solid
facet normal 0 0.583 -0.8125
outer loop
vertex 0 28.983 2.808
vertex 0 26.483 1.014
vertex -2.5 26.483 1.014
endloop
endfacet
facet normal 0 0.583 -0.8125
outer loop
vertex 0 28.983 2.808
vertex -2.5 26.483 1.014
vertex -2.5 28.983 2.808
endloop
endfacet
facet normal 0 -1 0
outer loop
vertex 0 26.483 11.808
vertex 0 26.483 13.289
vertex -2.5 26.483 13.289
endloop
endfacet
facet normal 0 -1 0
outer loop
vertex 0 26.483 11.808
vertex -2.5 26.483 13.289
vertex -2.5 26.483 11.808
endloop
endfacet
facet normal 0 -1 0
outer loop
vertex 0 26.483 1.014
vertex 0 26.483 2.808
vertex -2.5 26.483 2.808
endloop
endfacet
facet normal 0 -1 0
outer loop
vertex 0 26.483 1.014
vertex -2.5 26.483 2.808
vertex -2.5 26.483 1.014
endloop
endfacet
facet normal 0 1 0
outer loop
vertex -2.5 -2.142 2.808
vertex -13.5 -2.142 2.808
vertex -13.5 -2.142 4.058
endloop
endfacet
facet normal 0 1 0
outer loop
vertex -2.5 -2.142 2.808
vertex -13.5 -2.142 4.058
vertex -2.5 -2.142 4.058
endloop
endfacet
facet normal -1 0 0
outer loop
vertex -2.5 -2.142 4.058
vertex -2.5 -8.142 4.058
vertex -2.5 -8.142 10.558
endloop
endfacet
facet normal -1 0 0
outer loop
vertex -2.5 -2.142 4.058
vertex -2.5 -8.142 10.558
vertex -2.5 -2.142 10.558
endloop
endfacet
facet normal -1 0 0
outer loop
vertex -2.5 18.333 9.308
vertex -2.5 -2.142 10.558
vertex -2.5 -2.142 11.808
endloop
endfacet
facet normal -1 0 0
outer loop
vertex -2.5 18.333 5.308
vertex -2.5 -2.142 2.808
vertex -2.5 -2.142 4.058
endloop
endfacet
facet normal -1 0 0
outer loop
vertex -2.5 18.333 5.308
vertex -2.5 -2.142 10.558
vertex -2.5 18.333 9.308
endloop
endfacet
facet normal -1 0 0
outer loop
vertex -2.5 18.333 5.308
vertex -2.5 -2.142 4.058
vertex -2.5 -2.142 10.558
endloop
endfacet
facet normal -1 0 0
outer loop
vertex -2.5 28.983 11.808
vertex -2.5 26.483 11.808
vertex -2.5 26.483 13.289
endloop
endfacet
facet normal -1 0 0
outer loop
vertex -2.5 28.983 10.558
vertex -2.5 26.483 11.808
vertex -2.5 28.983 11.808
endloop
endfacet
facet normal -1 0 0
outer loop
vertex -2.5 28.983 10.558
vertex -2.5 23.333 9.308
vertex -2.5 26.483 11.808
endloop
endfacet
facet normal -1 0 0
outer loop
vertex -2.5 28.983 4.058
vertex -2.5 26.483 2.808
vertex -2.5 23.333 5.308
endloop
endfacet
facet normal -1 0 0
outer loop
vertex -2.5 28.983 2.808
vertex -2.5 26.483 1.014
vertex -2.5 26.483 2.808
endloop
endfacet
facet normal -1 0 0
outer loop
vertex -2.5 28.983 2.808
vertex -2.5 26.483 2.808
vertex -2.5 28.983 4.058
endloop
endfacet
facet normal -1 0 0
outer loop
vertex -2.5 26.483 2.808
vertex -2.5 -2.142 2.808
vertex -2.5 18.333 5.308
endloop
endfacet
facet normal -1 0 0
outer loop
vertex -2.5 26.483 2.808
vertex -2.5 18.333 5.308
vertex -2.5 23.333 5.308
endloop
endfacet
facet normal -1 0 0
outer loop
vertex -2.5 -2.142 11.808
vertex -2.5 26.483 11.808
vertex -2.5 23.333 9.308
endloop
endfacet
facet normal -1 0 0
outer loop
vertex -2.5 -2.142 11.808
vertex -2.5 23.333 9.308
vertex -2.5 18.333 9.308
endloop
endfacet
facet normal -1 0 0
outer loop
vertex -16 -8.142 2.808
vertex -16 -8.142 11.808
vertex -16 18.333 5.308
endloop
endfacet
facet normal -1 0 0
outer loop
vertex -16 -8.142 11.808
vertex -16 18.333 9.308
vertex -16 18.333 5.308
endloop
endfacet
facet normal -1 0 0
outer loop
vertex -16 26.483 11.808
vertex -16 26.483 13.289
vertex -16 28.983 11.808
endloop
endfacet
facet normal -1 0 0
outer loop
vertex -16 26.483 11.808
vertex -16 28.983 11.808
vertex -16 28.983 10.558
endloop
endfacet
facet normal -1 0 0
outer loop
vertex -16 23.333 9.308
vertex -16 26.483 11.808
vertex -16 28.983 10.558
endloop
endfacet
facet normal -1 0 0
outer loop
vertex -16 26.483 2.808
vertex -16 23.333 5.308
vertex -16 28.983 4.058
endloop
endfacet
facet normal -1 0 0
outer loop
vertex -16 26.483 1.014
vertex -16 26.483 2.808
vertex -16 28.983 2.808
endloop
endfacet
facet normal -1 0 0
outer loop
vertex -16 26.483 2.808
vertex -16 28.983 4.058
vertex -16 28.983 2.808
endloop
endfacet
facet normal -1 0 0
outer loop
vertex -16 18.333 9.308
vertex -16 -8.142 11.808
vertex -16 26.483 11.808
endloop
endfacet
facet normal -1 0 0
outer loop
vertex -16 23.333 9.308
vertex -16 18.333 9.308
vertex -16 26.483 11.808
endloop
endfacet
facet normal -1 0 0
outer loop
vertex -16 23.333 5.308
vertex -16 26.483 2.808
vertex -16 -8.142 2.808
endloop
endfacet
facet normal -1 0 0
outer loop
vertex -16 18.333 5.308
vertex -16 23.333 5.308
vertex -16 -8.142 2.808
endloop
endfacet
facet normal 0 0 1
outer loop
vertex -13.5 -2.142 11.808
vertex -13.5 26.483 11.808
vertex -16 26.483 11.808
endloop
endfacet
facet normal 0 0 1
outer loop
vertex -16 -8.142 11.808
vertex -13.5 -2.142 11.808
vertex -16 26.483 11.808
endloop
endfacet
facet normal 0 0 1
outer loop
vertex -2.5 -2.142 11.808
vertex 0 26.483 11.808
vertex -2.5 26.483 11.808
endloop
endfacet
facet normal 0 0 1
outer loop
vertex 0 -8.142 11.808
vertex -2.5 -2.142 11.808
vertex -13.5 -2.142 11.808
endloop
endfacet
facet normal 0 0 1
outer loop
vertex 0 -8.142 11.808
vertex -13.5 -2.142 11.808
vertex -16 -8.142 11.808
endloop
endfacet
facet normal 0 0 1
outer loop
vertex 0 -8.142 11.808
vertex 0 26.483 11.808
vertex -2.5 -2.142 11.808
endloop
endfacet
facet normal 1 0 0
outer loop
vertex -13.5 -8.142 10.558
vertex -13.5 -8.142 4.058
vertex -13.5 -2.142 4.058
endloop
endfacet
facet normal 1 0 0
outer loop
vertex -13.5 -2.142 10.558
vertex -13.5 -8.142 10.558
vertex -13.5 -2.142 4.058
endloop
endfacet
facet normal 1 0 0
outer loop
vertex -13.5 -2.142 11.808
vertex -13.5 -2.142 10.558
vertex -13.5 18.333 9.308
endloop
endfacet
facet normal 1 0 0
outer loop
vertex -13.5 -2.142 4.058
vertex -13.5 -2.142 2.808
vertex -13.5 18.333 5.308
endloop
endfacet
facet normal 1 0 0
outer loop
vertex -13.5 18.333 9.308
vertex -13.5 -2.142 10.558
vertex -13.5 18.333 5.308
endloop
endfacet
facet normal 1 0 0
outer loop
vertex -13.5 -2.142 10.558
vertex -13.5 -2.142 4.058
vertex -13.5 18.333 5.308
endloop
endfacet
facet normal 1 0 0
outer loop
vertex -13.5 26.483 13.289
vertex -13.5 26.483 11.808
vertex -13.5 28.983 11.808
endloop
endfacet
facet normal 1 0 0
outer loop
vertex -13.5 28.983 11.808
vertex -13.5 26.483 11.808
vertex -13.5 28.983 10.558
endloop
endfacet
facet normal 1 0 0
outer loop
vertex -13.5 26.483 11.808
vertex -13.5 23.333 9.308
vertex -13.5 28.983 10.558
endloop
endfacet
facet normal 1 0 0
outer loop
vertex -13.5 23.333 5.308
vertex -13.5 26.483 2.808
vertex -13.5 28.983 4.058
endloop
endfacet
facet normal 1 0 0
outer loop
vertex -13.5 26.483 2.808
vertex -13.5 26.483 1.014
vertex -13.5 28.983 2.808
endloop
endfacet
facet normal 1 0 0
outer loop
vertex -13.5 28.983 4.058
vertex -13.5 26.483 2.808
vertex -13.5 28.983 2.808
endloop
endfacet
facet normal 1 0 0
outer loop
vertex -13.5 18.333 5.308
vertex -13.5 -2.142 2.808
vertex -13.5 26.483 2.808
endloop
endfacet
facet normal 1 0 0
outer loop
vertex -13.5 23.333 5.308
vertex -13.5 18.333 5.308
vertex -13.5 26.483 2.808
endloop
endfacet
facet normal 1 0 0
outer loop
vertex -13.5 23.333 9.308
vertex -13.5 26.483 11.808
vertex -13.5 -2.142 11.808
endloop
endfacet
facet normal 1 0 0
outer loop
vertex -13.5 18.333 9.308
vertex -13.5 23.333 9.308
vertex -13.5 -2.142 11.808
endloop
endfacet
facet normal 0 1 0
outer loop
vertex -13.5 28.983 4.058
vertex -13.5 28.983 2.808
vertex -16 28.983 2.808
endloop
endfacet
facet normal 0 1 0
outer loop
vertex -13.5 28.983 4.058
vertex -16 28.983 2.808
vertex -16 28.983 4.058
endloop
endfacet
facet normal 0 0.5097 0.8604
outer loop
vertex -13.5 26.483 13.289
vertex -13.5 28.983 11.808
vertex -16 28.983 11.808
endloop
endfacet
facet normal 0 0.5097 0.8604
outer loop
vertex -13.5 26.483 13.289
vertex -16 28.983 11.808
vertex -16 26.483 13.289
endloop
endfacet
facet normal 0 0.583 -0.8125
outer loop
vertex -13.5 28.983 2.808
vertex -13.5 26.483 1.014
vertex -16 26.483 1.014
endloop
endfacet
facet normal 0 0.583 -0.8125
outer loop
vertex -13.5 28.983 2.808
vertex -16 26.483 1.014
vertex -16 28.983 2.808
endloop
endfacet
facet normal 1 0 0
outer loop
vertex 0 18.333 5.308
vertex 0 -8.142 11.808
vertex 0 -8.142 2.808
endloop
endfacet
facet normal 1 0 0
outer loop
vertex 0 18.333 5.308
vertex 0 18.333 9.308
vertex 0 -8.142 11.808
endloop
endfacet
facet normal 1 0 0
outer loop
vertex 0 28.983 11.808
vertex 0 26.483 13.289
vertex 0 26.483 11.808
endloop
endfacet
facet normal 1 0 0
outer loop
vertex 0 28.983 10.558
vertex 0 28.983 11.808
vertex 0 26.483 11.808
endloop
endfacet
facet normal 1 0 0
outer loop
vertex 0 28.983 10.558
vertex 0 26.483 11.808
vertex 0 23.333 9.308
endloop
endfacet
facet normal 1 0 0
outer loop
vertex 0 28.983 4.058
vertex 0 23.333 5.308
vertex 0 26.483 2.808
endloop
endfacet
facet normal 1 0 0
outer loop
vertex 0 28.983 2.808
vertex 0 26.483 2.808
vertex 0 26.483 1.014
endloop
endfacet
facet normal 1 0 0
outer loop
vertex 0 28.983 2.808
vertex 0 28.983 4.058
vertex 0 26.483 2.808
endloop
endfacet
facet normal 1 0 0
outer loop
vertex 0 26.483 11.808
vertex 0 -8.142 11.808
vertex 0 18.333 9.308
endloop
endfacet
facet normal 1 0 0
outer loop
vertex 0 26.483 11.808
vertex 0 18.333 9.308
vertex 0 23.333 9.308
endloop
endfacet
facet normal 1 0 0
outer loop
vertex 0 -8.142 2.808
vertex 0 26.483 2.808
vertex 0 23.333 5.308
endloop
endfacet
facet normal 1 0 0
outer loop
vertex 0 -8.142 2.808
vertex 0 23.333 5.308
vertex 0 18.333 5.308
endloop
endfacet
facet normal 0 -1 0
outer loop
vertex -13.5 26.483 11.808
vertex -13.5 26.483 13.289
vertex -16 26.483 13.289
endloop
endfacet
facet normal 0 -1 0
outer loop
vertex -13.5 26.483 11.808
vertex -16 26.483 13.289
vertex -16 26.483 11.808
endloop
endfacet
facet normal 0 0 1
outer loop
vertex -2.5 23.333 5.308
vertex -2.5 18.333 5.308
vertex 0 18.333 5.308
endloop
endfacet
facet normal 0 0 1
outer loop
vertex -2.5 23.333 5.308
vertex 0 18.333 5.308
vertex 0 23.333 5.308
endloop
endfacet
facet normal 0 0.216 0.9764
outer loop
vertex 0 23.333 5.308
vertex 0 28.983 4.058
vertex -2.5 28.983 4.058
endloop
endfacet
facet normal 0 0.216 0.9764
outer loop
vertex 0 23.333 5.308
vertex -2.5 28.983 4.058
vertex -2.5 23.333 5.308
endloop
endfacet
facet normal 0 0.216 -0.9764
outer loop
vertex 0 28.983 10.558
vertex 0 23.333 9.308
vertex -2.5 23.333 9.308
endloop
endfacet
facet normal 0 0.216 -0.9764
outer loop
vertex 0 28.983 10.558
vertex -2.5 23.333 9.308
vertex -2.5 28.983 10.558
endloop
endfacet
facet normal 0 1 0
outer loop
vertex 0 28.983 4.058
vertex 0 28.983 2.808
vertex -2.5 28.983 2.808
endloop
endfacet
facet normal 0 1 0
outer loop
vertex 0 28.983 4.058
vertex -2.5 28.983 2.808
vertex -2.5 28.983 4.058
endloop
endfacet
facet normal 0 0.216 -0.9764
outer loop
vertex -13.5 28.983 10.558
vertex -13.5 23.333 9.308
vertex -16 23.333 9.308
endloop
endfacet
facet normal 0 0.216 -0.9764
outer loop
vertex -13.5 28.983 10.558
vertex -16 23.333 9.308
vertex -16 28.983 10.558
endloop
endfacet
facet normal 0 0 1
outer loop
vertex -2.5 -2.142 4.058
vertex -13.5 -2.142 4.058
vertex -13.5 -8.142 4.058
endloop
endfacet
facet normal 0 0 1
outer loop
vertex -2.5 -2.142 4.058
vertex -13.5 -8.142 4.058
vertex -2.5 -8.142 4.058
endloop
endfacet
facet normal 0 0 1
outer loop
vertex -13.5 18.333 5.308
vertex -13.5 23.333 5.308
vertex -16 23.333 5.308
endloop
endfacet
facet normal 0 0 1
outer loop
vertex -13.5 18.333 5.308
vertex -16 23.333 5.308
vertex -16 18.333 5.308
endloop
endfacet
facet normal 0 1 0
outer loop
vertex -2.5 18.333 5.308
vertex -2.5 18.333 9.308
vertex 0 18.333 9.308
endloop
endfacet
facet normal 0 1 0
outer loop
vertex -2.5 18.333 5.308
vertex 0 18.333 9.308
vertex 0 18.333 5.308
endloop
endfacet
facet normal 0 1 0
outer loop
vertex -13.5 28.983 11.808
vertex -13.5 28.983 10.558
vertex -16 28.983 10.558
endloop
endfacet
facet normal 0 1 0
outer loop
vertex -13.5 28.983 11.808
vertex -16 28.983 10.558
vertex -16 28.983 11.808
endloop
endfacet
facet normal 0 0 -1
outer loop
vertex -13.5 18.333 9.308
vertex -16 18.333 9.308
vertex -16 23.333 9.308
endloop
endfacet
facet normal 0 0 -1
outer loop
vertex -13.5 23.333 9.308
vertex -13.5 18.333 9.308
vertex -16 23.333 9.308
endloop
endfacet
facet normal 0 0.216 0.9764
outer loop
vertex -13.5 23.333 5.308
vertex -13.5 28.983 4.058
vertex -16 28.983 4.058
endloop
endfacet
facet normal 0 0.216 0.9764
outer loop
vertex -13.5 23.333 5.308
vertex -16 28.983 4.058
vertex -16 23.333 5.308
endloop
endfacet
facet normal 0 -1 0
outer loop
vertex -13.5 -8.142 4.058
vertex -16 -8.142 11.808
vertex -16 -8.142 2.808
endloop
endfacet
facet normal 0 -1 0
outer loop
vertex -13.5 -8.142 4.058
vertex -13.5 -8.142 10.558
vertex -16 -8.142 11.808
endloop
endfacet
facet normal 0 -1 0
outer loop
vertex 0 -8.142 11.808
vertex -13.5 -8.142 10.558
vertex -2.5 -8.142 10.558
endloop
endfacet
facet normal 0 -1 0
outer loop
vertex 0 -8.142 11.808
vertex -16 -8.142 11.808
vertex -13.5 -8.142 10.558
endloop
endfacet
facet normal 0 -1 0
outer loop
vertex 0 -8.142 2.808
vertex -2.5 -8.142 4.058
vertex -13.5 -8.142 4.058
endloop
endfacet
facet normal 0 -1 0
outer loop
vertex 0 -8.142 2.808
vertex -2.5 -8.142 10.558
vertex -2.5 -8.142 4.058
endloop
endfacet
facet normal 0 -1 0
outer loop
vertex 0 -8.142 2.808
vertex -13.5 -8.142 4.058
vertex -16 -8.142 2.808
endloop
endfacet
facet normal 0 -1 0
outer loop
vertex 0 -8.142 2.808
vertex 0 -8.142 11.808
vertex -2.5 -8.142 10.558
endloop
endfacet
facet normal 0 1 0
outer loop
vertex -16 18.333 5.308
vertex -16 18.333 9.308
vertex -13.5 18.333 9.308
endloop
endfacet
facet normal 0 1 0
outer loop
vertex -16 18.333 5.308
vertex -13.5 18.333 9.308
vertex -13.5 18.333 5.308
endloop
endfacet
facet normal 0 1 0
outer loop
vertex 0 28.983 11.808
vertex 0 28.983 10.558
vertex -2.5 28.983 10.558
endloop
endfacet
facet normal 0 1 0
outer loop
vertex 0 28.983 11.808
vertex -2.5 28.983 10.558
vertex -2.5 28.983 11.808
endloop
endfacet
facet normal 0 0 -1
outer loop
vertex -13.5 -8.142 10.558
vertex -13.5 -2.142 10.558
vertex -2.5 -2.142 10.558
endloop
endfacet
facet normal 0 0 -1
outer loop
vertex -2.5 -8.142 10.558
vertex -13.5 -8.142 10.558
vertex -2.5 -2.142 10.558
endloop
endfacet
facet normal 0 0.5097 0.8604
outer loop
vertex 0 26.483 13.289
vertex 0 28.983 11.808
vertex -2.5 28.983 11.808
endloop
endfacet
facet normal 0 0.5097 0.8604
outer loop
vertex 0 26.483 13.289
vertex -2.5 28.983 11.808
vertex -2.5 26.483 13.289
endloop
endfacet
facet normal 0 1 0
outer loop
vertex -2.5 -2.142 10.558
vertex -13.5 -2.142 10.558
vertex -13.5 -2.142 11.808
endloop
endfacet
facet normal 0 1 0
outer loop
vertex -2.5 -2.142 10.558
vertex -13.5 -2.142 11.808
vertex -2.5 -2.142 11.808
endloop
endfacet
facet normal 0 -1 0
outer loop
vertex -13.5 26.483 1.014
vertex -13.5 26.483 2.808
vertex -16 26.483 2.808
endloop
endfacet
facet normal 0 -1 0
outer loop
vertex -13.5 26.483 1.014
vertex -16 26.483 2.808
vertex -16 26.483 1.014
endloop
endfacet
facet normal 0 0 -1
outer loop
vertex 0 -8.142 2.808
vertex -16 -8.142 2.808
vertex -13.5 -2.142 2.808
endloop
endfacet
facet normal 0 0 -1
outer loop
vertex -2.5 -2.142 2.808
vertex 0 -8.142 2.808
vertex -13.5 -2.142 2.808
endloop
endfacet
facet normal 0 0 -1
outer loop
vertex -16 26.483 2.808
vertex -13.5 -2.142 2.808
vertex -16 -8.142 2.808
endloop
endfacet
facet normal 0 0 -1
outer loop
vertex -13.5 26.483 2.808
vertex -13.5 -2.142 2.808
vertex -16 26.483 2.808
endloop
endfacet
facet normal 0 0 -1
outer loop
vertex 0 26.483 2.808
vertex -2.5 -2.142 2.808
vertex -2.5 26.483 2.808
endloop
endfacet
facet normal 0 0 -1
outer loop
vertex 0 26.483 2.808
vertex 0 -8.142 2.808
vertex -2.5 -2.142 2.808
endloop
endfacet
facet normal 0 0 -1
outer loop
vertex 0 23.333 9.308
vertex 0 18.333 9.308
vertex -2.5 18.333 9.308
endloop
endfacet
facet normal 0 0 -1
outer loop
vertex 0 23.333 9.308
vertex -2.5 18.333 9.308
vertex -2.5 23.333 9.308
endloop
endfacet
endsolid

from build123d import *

# Parameters (mm, degrees)
SKETCH1_W               = 9
SKETCH1_H               = 31.450000092
BOSS_EXTRUDE1_DEPTH     = 16
CUT_EXTRUDE1_DEPTH      = 35.82109913
CUT_EXTRUDE1_DEPTH_BACK = 35.82109913
SKETCH2_W               = 11
SKETCH2_H               = 31.125000096
CUT_EXTRUDE2_DEPTH      = 36.673425061
CUT_EXTRUDE2_DEPTH_BACK = 36.673425061
SKETCH3_W               = 4
SKETCH3_H               = 5
SKETCH4_W               = 11
SKETCH4_H               = 6.5
CUT_EXTRUDE3_DEPTH      = 38.434719306


with BuildPart() as part:
    # Sketch1 → Boss-Extrude1 (new body)
    with BuildSketch(Plane(origin=(0, 0, 0), x_dir=(0, 0, -1), z_dir=(1, 0, 0))):
        Polygon((-1.013717106, 26.482765172), (-2.807616659, 28.982765172), (-2.807616659, 26.482765172), align=None)
        Polygon((-2.807616659, 26.482765172), (-2.807616659, 28.982765172), (-4.057616659, 28.982765172), (-5.307616659, 23.332810224), (-5.307616659, 23.307765168), (-2.807616659, 23.307765168), align=None)
        Polygon((-11.807616659, 23.307765168), (-9.307616659, 23.307765168), (-9.307616659, 23.332810224), (-10.557616659, 28.982765172), (-11.807616659, 28.982765172), (-11.807616659, 26.482765172), align=None)
        Polygon((-13.288814039, 26.482765172), (-11.807616659, 26.482765172), (-11.807616659, 28.982765172), align=None)
        with Locations((-7.307616659, 7.582765122)):
            Rectangle(SKETCH1_W, SKETCH1_H)
    extrude(amount=-BOSS_EXTRUDE1_DEPTH)

    # Sketch2 → Cut-Extrude1 (cut, two sides: drawn at the far end of the back side and taken through both)
    with BuildSketch(Plane.XY.offset(11.807616659).offset(-CUT_EXTRUDE1_DEPTH_BACK)):
        with Locations((-8, 13.420265124)):
            Rectangle(SKETCH2_W, SKETCH2_H)
    extrude(amount=CUT_EXTRUDE1_DEPTH + CUT_EXTRUDE1_DEPTH_BACK, mode=Mode.SUBTRACT)

    # Sketch3 → Cut-Extrude2 (cut, two sides: drawn at the far end of the back side and taken through both)
    with BuildSketch(Plane(origin=(0, 0, 0), x_dir=(0, 0, -1), z_dir=(1, 0, 0)).offset(-CUT_EXTRUDE2_DEPTH_BACK)):
        with Locations((-7.307616659, 20.832810224)):
            Rectangle(SKETCH3_W, SKETCH3_H)
    extrude(amount=CUT_EXTRUDE2_DEPTH + CUT_EXTRUDE2_DEPTH_BACK, mode=Mode.SUBTRACT)

    # Sketch4 → Cut-Extrude3 (cut, through all)
    with BuildSketch(Plane(origin=(0, -2.142234924, 0), x_dir=(1, 0, 0), z_dir=(0, 1, 0))):
        with Locations((-8, -7.307616659)):
            Rectangle(SKETCH4_W, SKETCH4_H)
    extrude(amount=-CUT_EXTRUDE3_DEPTH, mode=Mode.SUBTRACT)


solid = part.part
